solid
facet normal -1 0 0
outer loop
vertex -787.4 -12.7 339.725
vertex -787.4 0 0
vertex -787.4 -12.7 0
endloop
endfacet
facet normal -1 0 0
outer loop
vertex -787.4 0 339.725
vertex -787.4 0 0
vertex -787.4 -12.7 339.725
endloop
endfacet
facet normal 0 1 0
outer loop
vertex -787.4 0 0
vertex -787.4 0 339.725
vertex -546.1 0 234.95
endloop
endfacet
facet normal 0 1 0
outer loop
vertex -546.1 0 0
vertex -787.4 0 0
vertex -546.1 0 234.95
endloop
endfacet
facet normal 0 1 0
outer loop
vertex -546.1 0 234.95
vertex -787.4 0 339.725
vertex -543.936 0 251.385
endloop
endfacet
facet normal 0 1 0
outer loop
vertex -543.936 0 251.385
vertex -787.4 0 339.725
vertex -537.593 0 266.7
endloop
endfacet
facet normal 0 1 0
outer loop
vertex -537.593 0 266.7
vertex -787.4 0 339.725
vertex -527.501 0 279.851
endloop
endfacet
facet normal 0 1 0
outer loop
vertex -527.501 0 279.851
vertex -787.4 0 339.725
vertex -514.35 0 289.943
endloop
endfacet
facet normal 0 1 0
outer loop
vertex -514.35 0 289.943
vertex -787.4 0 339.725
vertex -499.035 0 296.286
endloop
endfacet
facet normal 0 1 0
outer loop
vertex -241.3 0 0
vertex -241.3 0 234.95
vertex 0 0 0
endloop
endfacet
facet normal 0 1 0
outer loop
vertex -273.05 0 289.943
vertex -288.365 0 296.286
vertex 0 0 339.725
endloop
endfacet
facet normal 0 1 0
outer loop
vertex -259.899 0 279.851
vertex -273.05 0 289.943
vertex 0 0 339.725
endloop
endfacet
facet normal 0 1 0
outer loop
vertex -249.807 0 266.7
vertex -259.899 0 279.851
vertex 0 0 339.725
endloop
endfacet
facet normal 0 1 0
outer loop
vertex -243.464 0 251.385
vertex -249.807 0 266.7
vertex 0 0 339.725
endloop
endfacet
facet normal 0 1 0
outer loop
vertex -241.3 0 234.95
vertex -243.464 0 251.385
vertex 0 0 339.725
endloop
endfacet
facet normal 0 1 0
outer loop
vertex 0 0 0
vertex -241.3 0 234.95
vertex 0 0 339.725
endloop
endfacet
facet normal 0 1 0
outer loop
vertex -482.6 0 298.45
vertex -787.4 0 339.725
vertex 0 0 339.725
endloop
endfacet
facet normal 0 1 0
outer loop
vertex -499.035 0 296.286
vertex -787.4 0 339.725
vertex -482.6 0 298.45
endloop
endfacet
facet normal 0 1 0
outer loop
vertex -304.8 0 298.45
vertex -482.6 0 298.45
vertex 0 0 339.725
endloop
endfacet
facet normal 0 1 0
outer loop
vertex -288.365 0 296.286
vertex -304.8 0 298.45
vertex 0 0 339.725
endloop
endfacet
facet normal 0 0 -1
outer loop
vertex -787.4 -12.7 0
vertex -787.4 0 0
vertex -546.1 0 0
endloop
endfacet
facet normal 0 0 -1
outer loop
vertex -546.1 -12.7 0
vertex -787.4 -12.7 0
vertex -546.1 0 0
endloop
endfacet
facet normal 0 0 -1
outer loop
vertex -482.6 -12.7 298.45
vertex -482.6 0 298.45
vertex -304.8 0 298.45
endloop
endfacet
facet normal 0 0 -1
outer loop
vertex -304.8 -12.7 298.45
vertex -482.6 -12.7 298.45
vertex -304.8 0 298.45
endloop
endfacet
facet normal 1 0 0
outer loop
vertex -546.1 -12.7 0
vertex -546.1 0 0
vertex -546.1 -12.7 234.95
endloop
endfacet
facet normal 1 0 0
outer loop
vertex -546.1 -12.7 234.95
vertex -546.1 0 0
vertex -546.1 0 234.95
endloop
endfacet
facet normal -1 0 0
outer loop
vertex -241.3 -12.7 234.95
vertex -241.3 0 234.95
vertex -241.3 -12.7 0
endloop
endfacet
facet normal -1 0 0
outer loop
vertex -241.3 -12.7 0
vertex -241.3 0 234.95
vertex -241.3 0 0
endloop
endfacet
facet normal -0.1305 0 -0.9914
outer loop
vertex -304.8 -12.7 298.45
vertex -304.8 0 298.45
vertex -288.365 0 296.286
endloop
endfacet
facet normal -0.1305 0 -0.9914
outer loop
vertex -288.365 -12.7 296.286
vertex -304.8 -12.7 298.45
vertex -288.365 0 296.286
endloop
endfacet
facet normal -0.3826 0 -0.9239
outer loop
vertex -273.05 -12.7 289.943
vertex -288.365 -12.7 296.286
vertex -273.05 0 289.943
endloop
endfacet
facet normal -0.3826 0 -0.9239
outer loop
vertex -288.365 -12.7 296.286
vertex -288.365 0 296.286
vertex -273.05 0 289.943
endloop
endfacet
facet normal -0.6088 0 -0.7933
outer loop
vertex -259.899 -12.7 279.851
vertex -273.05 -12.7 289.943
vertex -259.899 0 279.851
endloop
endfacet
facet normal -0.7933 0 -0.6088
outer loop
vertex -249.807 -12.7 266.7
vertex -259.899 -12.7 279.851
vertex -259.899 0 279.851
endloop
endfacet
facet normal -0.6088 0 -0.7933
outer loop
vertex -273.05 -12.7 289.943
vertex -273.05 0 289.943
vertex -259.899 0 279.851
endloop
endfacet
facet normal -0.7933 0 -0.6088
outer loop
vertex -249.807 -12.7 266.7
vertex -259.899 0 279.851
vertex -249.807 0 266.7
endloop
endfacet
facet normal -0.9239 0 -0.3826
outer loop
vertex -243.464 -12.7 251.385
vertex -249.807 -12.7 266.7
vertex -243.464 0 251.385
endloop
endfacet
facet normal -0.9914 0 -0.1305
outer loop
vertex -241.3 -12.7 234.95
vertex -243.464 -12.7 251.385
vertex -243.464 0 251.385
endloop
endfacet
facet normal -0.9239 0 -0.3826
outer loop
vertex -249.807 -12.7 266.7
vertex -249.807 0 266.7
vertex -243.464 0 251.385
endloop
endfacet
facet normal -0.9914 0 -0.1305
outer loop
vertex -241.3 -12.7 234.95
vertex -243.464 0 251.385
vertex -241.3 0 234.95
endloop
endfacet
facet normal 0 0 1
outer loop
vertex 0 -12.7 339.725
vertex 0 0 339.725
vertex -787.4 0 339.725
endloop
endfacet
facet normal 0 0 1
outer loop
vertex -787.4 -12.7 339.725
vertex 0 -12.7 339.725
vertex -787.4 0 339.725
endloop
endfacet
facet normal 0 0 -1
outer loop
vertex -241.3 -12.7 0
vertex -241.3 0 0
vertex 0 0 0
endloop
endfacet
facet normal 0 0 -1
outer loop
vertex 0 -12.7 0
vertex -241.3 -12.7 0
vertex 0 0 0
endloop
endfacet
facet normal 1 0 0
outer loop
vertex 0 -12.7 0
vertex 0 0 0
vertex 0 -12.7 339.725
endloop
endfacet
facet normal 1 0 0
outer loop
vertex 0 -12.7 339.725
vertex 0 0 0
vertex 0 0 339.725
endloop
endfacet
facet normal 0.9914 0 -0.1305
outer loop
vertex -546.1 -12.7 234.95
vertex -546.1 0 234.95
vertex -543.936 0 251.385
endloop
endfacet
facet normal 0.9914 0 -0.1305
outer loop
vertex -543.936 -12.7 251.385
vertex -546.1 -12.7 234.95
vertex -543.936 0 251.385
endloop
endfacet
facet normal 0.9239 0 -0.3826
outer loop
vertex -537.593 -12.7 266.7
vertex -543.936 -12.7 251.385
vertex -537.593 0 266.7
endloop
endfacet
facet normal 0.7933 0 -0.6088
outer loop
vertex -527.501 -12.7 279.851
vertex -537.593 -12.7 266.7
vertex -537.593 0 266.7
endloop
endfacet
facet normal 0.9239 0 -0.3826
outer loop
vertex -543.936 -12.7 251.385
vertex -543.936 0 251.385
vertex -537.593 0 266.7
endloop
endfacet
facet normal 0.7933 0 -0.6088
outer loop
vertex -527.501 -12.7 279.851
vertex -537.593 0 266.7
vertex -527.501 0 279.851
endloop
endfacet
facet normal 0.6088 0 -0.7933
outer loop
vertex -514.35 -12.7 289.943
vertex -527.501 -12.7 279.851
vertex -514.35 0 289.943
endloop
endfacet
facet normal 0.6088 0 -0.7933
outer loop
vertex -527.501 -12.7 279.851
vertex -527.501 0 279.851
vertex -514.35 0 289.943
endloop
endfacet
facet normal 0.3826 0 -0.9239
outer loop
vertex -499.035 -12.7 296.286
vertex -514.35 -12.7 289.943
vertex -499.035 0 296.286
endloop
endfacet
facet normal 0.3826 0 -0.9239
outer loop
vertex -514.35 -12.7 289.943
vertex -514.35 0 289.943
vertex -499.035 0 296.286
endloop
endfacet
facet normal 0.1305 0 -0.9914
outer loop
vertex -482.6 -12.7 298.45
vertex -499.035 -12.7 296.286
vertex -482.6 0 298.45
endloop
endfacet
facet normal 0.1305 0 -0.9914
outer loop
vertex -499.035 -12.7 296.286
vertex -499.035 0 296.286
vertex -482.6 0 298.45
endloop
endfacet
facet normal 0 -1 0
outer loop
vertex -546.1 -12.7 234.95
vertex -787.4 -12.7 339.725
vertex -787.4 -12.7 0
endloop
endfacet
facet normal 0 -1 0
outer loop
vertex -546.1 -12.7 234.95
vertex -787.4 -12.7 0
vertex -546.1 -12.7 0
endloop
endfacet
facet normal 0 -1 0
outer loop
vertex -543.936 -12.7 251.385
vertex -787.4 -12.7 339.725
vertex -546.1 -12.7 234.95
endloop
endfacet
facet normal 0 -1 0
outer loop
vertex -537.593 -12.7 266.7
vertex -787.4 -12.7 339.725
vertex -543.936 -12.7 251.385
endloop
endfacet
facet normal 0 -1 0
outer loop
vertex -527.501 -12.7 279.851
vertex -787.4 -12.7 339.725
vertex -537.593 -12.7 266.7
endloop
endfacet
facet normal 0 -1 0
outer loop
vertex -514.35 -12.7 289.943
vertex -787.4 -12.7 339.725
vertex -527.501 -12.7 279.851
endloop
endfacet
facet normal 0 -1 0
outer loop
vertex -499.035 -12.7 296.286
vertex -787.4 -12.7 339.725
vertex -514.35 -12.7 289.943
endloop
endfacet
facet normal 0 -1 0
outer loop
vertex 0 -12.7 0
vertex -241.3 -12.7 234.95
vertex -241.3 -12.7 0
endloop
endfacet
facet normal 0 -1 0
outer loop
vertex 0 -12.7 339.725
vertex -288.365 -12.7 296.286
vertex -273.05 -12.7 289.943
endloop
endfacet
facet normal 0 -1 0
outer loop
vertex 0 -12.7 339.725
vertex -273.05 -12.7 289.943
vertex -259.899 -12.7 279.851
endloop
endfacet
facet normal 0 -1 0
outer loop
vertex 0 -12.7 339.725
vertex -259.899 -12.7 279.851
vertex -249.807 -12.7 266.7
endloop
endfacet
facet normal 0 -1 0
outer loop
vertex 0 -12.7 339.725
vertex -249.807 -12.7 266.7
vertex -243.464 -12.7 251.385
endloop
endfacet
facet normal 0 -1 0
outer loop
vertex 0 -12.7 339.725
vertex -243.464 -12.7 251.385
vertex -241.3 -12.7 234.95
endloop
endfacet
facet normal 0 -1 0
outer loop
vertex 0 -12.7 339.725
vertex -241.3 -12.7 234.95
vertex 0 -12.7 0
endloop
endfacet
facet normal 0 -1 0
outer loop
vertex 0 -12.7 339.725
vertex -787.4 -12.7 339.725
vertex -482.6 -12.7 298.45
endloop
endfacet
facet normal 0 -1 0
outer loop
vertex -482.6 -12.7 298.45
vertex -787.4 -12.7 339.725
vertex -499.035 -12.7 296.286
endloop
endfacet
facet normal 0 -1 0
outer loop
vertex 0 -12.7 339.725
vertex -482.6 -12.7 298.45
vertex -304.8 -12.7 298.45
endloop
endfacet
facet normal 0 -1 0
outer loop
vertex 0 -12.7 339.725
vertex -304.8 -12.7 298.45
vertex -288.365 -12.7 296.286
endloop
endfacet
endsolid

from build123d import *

# Parameters (mm, degrees)
F0_W     = 12.7
F0_H     = 339.725
F1_DEPTH = 12.7


with BuildPart() as f1:
    # F0 (on Front) → F1 (new body)
    with BuildSketch(Plane.XZ):
        with BuildLine():
            Line((-241.3, 0), (-12.7, 0))
            Line((-12.7, 0), (-12.7, 339.725))
            Line((-12.7, 339.725), (-774.7, 339.725))
            Line((-774.7, 339.725), (-774.7, 0))
            Line((-774.7, 0), (-546.1, 0))
            Line((-546.1, 0), (-546.1, 234.95))
            ThreePointArc((-546.1, 234.95), (-527.501281, 279.851281), (-482.6, 298.45))
            Line((-482.6, 298.45), (-393.7, 298.45))
            Line((-393.7, 298.45), (-304.8, 298.45))
            ThreePointArc((-304.8, 298.45), (-259.898719, 279.851281), (-241.3, 234.95))
            Line((-241.3, 234.95), (-241.3, 0))
        make_face()
        with Locations((-6.35, 169.8625)):
            Rectangle(F0_W, F0_H)
        with Locations((-781.05, 169.8625)):
            Rectangle(F0_W, F0_H)
    extrude(amount=F1_DEPTH)


solid = f1.part
